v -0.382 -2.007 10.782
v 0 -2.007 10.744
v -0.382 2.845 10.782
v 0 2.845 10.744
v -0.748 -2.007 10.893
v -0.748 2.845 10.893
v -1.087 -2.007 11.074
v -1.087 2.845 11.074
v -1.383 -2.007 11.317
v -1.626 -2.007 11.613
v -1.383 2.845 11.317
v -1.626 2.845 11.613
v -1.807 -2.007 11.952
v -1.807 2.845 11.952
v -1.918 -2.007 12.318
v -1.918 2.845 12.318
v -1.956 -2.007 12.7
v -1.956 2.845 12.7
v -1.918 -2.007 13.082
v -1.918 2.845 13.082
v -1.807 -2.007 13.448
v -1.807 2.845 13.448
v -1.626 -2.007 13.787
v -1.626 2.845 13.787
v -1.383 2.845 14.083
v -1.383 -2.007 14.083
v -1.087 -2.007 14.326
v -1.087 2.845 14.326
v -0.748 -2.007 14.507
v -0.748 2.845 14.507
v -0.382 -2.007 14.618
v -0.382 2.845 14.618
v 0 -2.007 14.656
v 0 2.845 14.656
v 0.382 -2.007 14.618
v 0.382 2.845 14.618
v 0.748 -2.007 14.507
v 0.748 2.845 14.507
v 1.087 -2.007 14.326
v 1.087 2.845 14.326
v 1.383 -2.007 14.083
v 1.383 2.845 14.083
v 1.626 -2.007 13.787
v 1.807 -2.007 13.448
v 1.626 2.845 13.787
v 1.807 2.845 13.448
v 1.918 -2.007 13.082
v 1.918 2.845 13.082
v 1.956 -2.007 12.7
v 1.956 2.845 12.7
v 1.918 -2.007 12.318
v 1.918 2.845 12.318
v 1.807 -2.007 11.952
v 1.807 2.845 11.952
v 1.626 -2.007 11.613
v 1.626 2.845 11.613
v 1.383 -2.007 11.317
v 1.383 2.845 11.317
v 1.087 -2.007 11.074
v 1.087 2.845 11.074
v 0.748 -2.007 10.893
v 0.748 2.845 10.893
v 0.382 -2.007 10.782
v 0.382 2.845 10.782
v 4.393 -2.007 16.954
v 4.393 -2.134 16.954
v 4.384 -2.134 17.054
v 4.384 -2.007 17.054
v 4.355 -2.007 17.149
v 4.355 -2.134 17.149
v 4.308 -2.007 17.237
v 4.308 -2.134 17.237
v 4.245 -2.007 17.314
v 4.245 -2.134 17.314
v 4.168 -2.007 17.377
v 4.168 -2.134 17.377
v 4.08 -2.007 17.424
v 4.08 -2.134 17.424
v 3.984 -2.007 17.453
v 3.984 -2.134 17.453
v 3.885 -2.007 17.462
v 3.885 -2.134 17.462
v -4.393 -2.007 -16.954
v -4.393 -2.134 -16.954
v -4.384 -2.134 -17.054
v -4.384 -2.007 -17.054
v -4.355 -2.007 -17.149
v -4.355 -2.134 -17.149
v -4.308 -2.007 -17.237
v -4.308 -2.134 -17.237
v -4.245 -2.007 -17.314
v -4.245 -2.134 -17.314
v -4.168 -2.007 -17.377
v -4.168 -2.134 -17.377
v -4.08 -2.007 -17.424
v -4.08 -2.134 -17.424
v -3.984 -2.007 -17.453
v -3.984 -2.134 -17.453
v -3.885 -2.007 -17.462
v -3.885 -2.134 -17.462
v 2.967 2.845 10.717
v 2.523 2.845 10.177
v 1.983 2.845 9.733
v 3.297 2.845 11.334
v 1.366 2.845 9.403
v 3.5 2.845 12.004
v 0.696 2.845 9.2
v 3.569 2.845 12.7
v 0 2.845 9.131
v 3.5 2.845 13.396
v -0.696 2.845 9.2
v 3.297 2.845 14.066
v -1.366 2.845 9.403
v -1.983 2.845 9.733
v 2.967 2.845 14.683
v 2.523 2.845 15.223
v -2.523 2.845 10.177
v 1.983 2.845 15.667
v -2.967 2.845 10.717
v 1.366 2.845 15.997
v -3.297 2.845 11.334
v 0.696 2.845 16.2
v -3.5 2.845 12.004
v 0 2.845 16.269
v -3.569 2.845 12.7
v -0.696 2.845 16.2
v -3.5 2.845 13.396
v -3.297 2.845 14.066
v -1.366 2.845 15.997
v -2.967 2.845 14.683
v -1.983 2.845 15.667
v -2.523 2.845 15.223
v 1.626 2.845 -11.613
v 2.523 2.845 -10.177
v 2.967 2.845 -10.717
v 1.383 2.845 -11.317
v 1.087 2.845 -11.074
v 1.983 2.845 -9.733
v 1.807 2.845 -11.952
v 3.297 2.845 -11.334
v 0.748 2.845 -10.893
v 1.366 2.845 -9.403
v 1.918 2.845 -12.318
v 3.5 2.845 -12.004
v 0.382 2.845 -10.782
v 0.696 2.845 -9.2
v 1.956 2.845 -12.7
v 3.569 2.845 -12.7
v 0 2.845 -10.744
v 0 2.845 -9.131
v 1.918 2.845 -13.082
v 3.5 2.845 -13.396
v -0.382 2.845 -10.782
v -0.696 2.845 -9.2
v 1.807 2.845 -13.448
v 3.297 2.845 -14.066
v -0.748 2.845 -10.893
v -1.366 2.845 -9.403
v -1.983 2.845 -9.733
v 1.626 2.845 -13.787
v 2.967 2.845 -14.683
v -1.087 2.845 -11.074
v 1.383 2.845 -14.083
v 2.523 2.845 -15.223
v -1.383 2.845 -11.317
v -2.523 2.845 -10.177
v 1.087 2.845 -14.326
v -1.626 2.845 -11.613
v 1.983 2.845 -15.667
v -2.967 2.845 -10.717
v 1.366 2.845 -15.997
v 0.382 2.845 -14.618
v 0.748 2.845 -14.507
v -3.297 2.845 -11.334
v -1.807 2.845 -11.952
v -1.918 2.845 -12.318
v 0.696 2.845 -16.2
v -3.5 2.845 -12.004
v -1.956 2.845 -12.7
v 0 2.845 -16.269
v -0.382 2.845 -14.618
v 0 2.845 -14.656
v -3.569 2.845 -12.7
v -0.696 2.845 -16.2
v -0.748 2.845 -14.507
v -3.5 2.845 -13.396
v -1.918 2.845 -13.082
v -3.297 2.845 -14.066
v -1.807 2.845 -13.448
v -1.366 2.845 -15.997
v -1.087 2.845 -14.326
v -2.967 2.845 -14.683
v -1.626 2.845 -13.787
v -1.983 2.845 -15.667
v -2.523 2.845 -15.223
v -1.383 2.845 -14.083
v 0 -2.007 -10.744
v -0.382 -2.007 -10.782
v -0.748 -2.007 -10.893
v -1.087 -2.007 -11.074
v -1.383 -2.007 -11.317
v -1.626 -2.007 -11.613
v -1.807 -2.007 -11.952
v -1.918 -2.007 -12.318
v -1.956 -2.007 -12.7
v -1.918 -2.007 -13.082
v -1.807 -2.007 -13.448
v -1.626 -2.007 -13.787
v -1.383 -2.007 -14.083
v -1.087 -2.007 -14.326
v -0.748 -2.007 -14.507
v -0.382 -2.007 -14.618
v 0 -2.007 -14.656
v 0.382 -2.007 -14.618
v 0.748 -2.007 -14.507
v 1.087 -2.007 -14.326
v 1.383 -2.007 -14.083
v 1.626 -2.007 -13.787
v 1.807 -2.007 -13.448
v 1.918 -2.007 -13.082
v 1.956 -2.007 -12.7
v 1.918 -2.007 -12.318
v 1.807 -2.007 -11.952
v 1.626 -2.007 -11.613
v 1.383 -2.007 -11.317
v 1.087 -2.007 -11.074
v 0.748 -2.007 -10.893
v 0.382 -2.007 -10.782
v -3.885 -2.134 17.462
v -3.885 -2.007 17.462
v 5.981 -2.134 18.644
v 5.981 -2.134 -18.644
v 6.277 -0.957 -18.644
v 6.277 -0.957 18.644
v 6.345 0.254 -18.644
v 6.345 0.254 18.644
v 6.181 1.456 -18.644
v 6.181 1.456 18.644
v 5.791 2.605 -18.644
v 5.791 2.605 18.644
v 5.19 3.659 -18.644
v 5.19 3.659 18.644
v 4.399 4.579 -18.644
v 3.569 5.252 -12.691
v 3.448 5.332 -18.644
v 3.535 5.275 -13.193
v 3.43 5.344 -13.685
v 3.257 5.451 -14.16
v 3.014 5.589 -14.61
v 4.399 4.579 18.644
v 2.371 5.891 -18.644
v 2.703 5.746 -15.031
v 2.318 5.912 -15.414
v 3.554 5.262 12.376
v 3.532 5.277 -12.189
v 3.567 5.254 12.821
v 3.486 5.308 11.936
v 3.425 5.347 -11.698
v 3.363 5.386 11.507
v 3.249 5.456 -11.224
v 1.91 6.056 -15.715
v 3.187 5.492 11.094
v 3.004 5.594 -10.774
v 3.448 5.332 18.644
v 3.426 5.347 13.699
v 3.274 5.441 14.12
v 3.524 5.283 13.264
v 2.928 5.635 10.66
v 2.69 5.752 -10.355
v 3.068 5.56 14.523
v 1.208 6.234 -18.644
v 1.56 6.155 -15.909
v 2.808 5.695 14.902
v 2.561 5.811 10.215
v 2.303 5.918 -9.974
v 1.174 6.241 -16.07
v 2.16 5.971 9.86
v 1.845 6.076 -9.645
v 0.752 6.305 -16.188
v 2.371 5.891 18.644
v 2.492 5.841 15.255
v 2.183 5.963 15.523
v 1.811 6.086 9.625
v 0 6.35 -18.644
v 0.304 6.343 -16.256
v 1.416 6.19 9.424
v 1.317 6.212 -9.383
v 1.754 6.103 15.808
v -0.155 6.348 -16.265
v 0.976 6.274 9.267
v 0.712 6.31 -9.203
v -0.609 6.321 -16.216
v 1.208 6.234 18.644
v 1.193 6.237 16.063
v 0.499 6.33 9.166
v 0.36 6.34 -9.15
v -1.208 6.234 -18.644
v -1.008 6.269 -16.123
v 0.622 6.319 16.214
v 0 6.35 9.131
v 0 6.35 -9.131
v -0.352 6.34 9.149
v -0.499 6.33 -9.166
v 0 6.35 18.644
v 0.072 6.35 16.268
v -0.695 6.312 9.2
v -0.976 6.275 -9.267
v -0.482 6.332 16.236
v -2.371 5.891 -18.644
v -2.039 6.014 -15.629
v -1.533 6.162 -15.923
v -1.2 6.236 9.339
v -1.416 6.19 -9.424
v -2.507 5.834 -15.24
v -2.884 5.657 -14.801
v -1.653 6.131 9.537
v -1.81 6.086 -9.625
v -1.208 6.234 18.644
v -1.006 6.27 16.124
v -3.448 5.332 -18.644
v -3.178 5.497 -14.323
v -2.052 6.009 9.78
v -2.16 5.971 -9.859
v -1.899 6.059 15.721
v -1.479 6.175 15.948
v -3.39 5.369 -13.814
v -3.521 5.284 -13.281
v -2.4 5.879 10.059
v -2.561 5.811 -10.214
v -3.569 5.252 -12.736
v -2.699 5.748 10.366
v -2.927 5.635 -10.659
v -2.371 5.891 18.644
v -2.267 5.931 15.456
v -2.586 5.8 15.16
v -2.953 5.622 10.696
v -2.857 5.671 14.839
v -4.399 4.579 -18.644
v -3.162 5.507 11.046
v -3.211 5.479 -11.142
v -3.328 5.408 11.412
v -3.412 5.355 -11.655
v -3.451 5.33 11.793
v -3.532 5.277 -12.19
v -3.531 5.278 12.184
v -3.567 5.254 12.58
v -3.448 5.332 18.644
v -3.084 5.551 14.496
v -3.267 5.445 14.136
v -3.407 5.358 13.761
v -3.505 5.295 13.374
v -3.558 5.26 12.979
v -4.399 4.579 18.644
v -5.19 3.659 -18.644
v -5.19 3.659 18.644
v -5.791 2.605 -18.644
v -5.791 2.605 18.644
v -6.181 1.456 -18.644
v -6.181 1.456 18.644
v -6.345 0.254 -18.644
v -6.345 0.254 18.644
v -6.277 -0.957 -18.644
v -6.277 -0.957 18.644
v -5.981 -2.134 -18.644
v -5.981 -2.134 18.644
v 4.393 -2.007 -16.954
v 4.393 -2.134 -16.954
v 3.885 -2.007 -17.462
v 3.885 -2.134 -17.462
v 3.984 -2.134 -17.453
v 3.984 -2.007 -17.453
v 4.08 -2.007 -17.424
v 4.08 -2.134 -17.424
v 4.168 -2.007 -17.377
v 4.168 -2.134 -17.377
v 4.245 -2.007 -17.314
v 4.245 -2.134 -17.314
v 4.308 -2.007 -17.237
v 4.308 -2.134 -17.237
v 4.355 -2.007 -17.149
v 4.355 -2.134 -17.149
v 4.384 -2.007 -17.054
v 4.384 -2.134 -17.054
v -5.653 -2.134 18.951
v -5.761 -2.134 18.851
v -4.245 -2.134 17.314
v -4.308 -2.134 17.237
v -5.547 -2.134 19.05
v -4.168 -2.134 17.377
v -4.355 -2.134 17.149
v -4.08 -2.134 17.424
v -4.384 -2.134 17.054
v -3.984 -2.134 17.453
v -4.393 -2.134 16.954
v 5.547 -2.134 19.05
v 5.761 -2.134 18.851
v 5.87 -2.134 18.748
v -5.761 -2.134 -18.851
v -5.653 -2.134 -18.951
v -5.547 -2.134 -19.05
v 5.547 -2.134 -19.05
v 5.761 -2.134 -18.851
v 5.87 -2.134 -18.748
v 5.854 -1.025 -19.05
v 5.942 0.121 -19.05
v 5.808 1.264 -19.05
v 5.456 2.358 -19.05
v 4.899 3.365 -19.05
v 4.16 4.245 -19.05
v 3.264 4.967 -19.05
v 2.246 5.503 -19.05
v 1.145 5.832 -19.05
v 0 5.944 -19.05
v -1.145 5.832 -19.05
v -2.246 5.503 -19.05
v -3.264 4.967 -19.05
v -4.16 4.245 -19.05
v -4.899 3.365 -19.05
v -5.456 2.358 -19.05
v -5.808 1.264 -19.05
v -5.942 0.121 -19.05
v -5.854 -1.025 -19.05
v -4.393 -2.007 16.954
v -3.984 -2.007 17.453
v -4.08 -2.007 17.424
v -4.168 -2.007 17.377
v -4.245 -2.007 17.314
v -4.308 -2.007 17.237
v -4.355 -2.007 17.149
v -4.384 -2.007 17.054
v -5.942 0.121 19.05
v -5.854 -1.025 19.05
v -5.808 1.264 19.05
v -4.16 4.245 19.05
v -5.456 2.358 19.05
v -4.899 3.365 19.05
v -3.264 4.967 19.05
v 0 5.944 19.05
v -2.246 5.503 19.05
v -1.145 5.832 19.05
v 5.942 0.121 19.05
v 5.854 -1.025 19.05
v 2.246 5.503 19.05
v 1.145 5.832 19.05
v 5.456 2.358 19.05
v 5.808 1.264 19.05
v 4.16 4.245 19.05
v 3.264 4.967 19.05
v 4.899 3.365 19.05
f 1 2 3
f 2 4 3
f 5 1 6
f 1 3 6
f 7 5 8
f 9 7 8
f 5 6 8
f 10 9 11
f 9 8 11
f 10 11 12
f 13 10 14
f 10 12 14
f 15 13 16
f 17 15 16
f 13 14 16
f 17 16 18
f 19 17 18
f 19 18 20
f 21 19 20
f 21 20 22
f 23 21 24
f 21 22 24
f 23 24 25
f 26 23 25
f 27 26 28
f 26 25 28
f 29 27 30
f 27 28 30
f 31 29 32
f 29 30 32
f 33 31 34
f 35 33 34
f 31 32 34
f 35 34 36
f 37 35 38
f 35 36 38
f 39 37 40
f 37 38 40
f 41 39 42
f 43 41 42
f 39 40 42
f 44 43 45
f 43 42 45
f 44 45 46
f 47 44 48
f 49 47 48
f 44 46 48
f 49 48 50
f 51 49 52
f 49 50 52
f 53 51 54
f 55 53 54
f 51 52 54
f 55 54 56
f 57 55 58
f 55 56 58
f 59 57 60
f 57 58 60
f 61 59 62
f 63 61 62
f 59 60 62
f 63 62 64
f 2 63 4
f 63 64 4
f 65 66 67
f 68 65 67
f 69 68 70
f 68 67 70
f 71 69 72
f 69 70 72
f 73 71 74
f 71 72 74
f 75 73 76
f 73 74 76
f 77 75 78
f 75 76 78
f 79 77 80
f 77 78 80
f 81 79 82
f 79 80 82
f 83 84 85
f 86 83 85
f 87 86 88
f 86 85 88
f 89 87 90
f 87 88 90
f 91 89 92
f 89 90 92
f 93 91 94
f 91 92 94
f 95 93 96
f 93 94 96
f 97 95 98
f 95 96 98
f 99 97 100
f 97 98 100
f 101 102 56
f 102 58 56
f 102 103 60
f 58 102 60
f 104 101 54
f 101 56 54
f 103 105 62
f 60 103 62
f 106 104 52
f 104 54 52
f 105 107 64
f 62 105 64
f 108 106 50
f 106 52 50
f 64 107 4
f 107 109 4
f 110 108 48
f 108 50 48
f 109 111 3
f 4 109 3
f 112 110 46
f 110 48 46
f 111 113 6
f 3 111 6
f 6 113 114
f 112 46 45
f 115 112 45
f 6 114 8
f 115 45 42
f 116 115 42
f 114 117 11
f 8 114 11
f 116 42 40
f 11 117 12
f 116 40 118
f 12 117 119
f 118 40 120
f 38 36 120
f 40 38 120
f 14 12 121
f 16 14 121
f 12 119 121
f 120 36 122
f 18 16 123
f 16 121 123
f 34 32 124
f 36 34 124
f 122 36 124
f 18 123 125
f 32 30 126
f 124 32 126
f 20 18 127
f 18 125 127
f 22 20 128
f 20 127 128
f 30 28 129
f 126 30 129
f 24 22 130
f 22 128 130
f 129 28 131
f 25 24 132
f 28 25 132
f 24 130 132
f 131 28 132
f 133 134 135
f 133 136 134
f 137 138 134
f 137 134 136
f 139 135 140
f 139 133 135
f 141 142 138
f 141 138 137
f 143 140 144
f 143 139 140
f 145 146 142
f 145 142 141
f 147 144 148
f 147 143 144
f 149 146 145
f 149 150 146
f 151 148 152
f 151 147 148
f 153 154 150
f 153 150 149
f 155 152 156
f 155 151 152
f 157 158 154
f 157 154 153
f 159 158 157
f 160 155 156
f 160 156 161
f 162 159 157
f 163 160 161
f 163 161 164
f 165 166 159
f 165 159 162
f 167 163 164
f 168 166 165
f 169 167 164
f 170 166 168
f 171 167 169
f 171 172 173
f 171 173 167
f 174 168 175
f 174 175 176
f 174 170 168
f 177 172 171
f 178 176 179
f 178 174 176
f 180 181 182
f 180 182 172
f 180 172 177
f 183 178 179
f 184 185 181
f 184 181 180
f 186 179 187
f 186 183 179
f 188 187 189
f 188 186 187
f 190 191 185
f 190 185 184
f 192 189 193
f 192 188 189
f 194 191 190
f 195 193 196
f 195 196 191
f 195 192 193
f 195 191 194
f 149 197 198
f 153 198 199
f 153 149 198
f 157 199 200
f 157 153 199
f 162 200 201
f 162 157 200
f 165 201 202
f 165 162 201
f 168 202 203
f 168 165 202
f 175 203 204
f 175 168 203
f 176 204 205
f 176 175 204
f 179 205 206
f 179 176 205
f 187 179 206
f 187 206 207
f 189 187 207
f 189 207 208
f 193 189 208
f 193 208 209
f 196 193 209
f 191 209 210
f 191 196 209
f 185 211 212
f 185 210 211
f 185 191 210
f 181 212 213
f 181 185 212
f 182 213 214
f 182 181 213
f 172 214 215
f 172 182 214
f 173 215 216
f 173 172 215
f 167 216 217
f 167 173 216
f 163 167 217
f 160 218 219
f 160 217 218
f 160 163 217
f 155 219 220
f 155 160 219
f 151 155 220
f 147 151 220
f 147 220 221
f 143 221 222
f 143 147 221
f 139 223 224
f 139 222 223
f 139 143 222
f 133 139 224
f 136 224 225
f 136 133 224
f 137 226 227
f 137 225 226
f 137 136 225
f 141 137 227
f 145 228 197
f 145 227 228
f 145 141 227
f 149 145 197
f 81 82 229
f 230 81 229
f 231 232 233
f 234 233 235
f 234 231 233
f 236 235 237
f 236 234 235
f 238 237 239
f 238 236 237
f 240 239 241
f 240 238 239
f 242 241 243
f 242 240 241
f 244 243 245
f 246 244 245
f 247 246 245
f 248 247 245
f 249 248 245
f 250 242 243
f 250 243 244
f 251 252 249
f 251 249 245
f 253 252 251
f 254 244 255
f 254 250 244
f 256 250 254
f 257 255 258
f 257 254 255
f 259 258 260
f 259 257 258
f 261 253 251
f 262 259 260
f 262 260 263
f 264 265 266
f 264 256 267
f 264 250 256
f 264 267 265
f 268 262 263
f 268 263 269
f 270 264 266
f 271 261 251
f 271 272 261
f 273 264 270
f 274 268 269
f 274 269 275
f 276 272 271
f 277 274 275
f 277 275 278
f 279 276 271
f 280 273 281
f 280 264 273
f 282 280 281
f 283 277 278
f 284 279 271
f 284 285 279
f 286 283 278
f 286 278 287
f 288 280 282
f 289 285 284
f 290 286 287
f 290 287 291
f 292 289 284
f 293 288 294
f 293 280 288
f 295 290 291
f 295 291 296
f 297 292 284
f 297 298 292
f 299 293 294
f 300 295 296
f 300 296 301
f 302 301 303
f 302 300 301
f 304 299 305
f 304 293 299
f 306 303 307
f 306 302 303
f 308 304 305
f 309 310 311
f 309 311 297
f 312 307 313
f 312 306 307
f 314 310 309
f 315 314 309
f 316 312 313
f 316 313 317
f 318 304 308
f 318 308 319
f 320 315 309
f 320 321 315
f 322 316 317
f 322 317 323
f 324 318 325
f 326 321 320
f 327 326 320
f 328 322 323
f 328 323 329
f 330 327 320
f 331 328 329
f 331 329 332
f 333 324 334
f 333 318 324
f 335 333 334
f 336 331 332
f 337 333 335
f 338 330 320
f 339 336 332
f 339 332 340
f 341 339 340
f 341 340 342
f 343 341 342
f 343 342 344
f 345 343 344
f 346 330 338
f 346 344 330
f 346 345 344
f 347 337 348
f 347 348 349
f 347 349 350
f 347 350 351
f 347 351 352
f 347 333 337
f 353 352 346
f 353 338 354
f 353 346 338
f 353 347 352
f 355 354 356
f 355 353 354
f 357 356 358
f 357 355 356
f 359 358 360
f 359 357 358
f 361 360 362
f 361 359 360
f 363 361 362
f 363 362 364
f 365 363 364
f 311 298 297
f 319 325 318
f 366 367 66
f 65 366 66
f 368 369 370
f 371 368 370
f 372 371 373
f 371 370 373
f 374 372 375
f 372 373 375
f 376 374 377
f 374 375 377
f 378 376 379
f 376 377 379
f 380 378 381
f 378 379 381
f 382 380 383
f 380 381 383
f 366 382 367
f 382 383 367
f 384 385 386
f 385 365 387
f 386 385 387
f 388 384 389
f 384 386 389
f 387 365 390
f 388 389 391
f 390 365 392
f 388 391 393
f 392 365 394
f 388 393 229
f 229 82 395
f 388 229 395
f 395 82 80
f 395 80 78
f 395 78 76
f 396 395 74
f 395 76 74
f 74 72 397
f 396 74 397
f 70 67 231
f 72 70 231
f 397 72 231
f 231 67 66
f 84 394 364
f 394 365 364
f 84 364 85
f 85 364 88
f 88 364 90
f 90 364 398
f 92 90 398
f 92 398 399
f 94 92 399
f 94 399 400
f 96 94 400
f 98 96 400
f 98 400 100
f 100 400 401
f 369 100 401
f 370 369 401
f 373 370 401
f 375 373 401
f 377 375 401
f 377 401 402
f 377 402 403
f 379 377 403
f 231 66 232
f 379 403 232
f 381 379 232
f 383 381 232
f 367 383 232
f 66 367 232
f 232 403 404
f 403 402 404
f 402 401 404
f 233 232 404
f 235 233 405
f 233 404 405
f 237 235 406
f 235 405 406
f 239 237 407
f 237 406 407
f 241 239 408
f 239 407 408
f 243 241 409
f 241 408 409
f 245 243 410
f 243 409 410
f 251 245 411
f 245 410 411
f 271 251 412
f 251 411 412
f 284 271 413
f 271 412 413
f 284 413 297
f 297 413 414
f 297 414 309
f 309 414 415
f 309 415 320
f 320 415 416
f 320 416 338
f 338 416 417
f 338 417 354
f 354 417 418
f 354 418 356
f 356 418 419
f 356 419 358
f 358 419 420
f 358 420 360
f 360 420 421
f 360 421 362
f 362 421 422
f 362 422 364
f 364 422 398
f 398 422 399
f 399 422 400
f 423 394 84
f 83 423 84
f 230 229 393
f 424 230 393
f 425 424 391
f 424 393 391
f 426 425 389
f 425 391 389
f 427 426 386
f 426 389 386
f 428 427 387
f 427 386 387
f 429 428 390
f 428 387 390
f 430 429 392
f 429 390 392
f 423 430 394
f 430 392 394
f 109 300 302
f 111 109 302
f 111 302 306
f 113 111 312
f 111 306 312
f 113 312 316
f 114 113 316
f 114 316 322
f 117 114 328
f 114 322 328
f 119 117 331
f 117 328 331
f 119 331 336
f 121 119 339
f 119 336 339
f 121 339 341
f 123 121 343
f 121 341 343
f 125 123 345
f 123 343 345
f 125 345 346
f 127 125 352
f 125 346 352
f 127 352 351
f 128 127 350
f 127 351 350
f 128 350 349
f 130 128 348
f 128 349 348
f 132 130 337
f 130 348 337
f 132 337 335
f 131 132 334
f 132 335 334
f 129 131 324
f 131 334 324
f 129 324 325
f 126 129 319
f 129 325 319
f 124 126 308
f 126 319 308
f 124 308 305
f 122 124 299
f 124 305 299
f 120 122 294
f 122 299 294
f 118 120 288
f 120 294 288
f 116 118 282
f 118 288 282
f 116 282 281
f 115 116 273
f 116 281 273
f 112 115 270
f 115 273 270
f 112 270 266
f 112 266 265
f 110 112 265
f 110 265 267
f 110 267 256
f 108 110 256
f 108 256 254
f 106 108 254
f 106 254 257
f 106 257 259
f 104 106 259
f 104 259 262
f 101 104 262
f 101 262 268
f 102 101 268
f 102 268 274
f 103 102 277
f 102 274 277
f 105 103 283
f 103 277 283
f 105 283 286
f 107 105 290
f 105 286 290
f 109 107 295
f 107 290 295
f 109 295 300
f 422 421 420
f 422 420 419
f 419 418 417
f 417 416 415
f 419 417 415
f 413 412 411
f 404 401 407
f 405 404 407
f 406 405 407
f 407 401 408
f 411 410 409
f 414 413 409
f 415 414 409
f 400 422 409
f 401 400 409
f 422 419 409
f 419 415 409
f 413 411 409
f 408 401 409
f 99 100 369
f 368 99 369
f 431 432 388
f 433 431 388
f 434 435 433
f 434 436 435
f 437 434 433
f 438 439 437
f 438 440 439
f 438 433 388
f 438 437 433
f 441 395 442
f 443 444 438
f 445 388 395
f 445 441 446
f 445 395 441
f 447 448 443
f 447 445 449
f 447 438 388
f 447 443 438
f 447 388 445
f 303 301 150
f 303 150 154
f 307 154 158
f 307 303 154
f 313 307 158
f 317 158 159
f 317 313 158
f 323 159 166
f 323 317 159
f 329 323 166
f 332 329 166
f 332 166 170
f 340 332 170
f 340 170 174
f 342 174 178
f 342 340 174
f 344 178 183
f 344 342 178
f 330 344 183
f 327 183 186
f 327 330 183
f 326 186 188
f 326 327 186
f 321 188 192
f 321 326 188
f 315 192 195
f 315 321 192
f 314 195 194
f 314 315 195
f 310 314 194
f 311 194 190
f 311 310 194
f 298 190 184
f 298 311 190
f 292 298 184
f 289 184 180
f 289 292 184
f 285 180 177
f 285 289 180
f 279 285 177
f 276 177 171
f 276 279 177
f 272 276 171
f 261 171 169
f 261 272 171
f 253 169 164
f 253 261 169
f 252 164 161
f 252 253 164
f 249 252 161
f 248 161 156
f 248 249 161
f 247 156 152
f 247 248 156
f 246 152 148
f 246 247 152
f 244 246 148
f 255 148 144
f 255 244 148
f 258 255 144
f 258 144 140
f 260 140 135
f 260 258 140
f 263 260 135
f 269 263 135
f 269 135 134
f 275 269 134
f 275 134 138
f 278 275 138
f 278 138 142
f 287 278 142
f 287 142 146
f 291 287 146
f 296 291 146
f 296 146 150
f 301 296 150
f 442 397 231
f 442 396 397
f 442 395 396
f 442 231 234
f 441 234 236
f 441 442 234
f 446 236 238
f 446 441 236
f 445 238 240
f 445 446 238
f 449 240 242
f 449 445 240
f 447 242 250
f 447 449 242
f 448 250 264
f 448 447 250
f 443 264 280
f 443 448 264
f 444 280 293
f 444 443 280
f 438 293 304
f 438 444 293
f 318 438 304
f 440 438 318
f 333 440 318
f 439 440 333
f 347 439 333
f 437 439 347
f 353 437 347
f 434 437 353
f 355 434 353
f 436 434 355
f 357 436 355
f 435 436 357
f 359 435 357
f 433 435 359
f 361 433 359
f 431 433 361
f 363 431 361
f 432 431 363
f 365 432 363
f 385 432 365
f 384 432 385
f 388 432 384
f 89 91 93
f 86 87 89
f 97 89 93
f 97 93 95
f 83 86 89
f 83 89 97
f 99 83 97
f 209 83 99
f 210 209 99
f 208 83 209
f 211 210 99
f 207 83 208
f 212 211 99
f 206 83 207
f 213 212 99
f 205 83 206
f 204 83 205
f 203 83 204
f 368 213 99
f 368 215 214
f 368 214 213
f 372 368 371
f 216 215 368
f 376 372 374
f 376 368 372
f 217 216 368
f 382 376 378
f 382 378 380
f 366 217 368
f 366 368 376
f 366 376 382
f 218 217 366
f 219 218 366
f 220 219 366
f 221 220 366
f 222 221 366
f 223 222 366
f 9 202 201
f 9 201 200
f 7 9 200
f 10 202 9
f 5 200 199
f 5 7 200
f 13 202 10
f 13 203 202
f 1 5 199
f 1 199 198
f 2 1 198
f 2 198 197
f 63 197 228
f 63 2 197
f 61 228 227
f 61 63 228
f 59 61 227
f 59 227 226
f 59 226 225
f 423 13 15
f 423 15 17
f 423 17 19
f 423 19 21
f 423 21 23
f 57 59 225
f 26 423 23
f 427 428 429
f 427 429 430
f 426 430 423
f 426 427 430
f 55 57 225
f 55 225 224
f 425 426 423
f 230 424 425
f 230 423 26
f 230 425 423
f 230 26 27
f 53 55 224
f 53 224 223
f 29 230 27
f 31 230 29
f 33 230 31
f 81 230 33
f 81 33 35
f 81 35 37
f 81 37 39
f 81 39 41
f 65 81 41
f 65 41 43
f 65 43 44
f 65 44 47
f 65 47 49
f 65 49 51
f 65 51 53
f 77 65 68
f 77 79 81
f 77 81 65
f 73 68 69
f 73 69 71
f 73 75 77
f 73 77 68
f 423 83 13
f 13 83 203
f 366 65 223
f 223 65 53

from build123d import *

# Parameters (mm, degrees)
SKETCH1_R            = 6.35
EXTRUDE1_DEPTH       = 19.05
CHAMFER1_SIZE        = 0.4064
TRUNCATED_DEPTH      = 20.05
TRUNCATED_DEPTH_BACK = 20.05
RECESSED_DEPTH       = 0.127


with BuildPart() as part:
    # Sketch1 → Extrude1 (new body, symmetric)
    with BuildSketch(Plane.XY):
        Circle(SKETCH1_R)
    extrude(amount=EXTRUDE1_DEPTH, both=True)

    # Chamfer1
    chamfer1_edges = [part.edges().sort_by_distance(p)[0] for p in [
        (-6.35, 0, -19.05),
        (-6.35, 0, 19.05),
    ]]
    chamfer(chamfer1_edges, length=CHAMFER1_SIZE)

    # Sketch2 → Truncated (cut, two sides)
    with BuildSketch(Plane.XY) as truncated_sk:
        with BuildLine():
            Line((-5.980823609, -2.1336), (5.980823609, -2.1336))
            ThreePointArc((5.980823609, -2.1336), (0, -6.35), (-5.980823609, -2.1336))
        make_face()
    extrude(amount=TRUNCATED_DEPTH, mode=Mode.SUBTRACT)
    extrude(truncated_sk.sketch, amount=-TRUNCATED_DEPTH_BACK, mode=Mode.SUBTRACT)

    # Sketch3 → Recessed (cut)
    with BuildSketch(Plane.XZ.offset(2.1336)):
        with BuildLine():
            Line((3.885323609, 17.4625), (-3.885323609, 17.4625))
            ThreePointArc((-3.885323609, 17.4625), (-4.244533854, 17.313710245), (-4.393323609, 16.9545))
            Line((-4.393323609, 16.9545), (-4.393323609, -16.9545))
            ThreePointArc((-4.393323609, -16.9545), (-4.244533854, -17.313710245), (-3.885323609, -17.4625))
            Line((-3.885323609, -17.4625), (3.885323609, -17.4625))
            ThreePointArc((3.885323609, -17.4625), (4.244533854, -17.313710245), (4.393323609, -16.9545))
            Line((4.393323609, -16.9545), (4.393323609, 16.9545))
            ThreePointArc((4.393323609, 16.9545), (4.244533854, 17.313710245), (3.885323609, 17.4625))
        make_face()
    extrude(amount=-RECESSED_DEPTH, mode=Mode.SUBTRACT)

    # Sketch5 → CtBored Hole Cut-Revolve1 (revolve, cut)
    with BuildSketch(Plane(origin=(0, 0, 0), x_dir=(0, 0, -1), z_dir=(1, 0, 0)), mode=Mode.PRIVATE) as ctbored_hole_cut_revolve1_sk:
        Polygon((14.6558, -6.35), (14.6558, 2.8448), (16.2687, 2.8448), (16.2687, 6.35), (12.7, 6.35), (12.7, -6.35), align=None)
    ctbored_hole_cut_revolve1 = revolve(ctbored_hole_cut_revolve1_sk.sketch.rotate(Axis((0, 11.226654631, -12.7), (0, -1, 0)), 180), axis=Axis((0, 11.226654631, -12.7), (0, -1, 0)), mode=Mode.SUBTRACT)  # turned: the seam where the file's is

    # CtBored Hole Mirror1: CtBored Hole Cut-Revolve1 across plane
    add(ctbored_hole_cut_revolve1.mirror(Plane.XY), mode=Mode.SUBTRACT)


solid = part.part
